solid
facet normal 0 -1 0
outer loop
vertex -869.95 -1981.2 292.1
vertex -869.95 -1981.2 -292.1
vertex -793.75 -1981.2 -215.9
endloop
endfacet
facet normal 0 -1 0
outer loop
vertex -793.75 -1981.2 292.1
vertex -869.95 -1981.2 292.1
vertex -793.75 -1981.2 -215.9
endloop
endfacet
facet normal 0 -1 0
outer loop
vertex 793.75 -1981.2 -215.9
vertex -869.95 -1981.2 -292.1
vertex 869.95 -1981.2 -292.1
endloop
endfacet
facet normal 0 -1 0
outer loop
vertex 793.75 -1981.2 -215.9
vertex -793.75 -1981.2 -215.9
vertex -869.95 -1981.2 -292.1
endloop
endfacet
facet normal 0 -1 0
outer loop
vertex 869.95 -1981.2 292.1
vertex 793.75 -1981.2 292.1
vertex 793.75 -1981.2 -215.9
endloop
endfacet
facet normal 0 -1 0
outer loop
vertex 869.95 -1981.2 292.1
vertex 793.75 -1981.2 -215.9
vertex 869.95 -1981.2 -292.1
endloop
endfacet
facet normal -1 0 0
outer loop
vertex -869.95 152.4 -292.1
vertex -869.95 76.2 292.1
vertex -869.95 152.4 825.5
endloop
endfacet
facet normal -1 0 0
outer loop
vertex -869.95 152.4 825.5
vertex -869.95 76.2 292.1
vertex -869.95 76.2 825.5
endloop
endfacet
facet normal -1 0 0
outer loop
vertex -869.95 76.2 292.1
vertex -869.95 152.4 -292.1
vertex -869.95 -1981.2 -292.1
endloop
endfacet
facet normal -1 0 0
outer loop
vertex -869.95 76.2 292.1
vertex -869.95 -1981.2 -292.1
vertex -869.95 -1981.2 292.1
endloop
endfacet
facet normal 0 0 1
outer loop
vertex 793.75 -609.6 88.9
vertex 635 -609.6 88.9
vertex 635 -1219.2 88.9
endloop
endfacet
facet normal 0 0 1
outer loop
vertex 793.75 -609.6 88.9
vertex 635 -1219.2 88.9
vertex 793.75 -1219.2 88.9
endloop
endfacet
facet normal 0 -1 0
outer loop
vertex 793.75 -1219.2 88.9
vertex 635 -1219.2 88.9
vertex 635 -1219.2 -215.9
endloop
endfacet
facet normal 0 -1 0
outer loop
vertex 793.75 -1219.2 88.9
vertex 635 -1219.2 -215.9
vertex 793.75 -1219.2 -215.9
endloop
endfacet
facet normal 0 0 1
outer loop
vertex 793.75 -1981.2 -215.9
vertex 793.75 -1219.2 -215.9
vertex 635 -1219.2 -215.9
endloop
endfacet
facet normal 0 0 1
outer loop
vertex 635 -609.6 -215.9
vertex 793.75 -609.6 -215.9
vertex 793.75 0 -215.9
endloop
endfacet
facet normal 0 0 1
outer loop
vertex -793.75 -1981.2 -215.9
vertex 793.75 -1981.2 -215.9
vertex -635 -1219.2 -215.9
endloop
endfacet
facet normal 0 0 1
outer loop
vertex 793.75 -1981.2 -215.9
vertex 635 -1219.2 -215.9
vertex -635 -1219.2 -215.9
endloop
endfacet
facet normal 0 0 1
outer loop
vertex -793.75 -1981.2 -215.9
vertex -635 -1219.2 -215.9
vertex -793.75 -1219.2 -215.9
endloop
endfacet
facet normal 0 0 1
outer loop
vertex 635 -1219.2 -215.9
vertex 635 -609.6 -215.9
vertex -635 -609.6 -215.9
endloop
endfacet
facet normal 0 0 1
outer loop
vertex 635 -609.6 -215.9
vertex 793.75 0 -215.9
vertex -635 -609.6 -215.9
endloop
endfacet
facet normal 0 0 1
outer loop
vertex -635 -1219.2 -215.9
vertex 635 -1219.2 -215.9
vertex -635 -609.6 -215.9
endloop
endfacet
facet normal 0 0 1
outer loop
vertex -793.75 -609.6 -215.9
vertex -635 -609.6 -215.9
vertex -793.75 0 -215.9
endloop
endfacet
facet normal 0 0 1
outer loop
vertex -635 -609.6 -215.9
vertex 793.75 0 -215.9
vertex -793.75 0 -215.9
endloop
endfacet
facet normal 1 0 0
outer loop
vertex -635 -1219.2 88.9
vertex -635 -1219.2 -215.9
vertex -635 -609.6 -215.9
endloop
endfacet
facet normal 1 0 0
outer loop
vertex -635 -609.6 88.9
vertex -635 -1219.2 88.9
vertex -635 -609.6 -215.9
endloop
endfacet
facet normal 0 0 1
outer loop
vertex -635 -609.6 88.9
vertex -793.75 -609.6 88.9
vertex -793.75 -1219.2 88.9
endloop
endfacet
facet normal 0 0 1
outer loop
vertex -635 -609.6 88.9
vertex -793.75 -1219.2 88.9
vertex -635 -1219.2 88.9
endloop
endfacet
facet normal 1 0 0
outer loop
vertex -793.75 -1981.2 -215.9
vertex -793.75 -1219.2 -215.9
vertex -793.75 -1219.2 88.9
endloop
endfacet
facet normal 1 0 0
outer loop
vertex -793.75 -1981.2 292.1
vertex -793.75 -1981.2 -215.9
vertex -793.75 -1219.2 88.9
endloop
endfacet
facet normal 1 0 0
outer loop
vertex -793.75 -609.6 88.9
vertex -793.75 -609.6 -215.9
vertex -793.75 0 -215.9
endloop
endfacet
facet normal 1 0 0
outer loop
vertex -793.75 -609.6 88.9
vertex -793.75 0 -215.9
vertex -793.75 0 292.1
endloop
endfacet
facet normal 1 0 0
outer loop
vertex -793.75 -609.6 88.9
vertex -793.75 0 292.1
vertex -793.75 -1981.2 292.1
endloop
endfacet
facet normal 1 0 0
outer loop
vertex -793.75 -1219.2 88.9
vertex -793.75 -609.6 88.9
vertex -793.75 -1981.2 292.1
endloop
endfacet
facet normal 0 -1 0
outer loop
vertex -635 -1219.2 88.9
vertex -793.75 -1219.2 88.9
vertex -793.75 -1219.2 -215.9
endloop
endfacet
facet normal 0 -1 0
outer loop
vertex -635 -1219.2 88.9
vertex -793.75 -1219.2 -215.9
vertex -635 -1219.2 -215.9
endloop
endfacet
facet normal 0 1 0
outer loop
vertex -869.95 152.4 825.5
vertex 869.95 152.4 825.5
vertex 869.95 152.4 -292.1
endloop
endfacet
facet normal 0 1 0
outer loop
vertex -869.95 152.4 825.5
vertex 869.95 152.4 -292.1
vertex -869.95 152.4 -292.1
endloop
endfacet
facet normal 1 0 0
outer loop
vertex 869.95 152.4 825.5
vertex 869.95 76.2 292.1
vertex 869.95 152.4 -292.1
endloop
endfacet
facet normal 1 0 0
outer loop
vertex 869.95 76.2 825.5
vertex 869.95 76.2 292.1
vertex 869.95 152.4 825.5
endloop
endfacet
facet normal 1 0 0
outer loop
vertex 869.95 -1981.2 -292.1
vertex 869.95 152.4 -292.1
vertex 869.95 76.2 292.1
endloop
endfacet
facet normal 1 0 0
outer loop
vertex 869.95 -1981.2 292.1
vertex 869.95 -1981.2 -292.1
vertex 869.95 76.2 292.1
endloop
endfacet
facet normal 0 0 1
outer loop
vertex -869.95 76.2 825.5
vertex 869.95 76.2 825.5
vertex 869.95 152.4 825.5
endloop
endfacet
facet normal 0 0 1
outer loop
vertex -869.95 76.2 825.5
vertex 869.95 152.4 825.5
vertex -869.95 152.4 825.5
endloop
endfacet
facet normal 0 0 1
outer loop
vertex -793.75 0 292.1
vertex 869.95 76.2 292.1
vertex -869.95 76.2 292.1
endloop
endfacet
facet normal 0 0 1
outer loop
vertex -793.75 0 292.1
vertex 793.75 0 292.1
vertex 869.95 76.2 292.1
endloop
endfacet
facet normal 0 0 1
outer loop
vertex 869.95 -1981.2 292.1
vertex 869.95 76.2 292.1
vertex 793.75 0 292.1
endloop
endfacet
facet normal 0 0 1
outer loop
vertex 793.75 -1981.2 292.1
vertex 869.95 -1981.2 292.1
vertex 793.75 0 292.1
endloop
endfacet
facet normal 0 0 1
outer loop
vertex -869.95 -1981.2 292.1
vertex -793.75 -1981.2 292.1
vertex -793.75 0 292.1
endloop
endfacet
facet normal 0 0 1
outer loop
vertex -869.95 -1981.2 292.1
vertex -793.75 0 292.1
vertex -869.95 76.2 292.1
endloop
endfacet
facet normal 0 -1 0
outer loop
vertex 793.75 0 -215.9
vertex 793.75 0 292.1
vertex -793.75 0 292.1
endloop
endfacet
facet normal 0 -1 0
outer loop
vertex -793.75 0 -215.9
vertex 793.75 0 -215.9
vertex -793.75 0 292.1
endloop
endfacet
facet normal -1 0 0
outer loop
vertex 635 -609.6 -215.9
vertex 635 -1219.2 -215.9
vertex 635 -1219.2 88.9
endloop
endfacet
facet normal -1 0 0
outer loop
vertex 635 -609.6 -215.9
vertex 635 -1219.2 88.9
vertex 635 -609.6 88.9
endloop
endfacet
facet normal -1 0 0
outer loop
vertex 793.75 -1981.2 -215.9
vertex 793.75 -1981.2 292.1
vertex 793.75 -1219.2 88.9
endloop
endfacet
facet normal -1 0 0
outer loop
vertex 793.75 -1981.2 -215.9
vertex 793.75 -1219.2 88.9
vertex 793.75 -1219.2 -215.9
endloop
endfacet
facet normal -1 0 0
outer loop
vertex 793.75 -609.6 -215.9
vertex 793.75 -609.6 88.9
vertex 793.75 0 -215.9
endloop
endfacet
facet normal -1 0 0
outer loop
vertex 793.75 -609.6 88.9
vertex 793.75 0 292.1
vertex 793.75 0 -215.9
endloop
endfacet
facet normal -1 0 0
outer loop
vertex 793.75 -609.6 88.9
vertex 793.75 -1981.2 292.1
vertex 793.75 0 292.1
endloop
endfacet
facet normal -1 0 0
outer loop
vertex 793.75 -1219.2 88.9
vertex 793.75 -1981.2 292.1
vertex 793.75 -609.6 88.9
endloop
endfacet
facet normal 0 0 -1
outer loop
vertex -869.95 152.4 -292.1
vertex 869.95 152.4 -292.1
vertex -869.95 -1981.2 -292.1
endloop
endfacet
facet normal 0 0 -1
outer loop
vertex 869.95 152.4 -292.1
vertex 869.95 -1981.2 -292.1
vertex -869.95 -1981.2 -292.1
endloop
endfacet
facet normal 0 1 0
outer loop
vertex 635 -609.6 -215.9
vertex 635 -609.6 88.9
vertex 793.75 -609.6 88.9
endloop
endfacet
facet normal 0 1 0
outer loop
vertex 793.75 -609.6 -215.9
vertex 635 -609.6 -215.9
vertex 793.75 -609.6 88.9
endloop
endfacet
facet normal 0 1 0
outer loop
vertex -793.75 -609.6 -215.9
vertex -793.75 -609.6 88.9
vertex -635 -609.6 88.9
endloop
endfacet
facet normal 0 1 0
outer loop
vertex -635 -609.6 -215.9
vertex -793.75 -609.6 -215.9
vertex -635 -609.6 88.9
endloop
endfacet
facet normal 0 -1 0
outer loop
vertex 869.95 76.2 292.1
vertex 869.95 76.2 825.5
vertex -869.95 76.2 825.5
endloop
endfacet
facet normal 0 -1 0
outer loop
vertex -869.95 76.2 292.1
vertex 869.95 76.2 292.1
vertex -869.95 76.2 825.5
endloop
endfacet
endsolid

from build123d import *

# Parameters (mm, degrees)
F1_DEPTH = 1981.2
F2_W     = 1739.9
F2_H     = 584.2
F3_DEPTH = 76.2
F4_W     = 158.75
F4_H     = 609.6
F5_DEPTH = 304.8
F6_W     = 1739.9
F6_H     = 1117.6
F7_DEPTH = 76.2


with BuildPart() as f1:
    # F0 (on Front) → F1 (new body)
    with BuildSketch(Plane.XZ):
        Polygon((869.95, -292.1), (869.95, 292.1), (793.75, 292.1), (793.75, -215.9), (-793.75, -215.9), (-793.75, 292.1), (-869.95, 292.1), (-869.95, -292.1), align=None)
    extrude(amount=F1_DEPTH)

    # F2 (on face) → F3 (join)
    with BuildSketch(Plane(origin=(0, 0, 0), x_dir=(-1, 0, 0), z_dir=(0, 1, 0))):
        Rectangle(F2_W, F2_H)
    extrude(amount=F3_DEPTH)

    # F4 (on face) → F5 (join)
    with BuildSketch(Plane.XY.offset(-215.9)):
        with Locations((-714.375, -914.4)):
            Rectangle(F4_W, F4_H)
        with Locations((714.375, -914.4)):
            Rectangle(F4_W, F4_H)
    extrude(amount=F5_DEPTH)

    # F6 (on face) → F7 (join)
    with BuildSketch(Plane(origin=(0, 76.2, 0), x_dir=(-1, 0, 0), z_dir=(0, 1, 0))):
        with Locations((0, 266.7)):
            Rectangle(F6_W, F6_H)
    extrude(amount=F7_DEPTH)


solid = f1.part
